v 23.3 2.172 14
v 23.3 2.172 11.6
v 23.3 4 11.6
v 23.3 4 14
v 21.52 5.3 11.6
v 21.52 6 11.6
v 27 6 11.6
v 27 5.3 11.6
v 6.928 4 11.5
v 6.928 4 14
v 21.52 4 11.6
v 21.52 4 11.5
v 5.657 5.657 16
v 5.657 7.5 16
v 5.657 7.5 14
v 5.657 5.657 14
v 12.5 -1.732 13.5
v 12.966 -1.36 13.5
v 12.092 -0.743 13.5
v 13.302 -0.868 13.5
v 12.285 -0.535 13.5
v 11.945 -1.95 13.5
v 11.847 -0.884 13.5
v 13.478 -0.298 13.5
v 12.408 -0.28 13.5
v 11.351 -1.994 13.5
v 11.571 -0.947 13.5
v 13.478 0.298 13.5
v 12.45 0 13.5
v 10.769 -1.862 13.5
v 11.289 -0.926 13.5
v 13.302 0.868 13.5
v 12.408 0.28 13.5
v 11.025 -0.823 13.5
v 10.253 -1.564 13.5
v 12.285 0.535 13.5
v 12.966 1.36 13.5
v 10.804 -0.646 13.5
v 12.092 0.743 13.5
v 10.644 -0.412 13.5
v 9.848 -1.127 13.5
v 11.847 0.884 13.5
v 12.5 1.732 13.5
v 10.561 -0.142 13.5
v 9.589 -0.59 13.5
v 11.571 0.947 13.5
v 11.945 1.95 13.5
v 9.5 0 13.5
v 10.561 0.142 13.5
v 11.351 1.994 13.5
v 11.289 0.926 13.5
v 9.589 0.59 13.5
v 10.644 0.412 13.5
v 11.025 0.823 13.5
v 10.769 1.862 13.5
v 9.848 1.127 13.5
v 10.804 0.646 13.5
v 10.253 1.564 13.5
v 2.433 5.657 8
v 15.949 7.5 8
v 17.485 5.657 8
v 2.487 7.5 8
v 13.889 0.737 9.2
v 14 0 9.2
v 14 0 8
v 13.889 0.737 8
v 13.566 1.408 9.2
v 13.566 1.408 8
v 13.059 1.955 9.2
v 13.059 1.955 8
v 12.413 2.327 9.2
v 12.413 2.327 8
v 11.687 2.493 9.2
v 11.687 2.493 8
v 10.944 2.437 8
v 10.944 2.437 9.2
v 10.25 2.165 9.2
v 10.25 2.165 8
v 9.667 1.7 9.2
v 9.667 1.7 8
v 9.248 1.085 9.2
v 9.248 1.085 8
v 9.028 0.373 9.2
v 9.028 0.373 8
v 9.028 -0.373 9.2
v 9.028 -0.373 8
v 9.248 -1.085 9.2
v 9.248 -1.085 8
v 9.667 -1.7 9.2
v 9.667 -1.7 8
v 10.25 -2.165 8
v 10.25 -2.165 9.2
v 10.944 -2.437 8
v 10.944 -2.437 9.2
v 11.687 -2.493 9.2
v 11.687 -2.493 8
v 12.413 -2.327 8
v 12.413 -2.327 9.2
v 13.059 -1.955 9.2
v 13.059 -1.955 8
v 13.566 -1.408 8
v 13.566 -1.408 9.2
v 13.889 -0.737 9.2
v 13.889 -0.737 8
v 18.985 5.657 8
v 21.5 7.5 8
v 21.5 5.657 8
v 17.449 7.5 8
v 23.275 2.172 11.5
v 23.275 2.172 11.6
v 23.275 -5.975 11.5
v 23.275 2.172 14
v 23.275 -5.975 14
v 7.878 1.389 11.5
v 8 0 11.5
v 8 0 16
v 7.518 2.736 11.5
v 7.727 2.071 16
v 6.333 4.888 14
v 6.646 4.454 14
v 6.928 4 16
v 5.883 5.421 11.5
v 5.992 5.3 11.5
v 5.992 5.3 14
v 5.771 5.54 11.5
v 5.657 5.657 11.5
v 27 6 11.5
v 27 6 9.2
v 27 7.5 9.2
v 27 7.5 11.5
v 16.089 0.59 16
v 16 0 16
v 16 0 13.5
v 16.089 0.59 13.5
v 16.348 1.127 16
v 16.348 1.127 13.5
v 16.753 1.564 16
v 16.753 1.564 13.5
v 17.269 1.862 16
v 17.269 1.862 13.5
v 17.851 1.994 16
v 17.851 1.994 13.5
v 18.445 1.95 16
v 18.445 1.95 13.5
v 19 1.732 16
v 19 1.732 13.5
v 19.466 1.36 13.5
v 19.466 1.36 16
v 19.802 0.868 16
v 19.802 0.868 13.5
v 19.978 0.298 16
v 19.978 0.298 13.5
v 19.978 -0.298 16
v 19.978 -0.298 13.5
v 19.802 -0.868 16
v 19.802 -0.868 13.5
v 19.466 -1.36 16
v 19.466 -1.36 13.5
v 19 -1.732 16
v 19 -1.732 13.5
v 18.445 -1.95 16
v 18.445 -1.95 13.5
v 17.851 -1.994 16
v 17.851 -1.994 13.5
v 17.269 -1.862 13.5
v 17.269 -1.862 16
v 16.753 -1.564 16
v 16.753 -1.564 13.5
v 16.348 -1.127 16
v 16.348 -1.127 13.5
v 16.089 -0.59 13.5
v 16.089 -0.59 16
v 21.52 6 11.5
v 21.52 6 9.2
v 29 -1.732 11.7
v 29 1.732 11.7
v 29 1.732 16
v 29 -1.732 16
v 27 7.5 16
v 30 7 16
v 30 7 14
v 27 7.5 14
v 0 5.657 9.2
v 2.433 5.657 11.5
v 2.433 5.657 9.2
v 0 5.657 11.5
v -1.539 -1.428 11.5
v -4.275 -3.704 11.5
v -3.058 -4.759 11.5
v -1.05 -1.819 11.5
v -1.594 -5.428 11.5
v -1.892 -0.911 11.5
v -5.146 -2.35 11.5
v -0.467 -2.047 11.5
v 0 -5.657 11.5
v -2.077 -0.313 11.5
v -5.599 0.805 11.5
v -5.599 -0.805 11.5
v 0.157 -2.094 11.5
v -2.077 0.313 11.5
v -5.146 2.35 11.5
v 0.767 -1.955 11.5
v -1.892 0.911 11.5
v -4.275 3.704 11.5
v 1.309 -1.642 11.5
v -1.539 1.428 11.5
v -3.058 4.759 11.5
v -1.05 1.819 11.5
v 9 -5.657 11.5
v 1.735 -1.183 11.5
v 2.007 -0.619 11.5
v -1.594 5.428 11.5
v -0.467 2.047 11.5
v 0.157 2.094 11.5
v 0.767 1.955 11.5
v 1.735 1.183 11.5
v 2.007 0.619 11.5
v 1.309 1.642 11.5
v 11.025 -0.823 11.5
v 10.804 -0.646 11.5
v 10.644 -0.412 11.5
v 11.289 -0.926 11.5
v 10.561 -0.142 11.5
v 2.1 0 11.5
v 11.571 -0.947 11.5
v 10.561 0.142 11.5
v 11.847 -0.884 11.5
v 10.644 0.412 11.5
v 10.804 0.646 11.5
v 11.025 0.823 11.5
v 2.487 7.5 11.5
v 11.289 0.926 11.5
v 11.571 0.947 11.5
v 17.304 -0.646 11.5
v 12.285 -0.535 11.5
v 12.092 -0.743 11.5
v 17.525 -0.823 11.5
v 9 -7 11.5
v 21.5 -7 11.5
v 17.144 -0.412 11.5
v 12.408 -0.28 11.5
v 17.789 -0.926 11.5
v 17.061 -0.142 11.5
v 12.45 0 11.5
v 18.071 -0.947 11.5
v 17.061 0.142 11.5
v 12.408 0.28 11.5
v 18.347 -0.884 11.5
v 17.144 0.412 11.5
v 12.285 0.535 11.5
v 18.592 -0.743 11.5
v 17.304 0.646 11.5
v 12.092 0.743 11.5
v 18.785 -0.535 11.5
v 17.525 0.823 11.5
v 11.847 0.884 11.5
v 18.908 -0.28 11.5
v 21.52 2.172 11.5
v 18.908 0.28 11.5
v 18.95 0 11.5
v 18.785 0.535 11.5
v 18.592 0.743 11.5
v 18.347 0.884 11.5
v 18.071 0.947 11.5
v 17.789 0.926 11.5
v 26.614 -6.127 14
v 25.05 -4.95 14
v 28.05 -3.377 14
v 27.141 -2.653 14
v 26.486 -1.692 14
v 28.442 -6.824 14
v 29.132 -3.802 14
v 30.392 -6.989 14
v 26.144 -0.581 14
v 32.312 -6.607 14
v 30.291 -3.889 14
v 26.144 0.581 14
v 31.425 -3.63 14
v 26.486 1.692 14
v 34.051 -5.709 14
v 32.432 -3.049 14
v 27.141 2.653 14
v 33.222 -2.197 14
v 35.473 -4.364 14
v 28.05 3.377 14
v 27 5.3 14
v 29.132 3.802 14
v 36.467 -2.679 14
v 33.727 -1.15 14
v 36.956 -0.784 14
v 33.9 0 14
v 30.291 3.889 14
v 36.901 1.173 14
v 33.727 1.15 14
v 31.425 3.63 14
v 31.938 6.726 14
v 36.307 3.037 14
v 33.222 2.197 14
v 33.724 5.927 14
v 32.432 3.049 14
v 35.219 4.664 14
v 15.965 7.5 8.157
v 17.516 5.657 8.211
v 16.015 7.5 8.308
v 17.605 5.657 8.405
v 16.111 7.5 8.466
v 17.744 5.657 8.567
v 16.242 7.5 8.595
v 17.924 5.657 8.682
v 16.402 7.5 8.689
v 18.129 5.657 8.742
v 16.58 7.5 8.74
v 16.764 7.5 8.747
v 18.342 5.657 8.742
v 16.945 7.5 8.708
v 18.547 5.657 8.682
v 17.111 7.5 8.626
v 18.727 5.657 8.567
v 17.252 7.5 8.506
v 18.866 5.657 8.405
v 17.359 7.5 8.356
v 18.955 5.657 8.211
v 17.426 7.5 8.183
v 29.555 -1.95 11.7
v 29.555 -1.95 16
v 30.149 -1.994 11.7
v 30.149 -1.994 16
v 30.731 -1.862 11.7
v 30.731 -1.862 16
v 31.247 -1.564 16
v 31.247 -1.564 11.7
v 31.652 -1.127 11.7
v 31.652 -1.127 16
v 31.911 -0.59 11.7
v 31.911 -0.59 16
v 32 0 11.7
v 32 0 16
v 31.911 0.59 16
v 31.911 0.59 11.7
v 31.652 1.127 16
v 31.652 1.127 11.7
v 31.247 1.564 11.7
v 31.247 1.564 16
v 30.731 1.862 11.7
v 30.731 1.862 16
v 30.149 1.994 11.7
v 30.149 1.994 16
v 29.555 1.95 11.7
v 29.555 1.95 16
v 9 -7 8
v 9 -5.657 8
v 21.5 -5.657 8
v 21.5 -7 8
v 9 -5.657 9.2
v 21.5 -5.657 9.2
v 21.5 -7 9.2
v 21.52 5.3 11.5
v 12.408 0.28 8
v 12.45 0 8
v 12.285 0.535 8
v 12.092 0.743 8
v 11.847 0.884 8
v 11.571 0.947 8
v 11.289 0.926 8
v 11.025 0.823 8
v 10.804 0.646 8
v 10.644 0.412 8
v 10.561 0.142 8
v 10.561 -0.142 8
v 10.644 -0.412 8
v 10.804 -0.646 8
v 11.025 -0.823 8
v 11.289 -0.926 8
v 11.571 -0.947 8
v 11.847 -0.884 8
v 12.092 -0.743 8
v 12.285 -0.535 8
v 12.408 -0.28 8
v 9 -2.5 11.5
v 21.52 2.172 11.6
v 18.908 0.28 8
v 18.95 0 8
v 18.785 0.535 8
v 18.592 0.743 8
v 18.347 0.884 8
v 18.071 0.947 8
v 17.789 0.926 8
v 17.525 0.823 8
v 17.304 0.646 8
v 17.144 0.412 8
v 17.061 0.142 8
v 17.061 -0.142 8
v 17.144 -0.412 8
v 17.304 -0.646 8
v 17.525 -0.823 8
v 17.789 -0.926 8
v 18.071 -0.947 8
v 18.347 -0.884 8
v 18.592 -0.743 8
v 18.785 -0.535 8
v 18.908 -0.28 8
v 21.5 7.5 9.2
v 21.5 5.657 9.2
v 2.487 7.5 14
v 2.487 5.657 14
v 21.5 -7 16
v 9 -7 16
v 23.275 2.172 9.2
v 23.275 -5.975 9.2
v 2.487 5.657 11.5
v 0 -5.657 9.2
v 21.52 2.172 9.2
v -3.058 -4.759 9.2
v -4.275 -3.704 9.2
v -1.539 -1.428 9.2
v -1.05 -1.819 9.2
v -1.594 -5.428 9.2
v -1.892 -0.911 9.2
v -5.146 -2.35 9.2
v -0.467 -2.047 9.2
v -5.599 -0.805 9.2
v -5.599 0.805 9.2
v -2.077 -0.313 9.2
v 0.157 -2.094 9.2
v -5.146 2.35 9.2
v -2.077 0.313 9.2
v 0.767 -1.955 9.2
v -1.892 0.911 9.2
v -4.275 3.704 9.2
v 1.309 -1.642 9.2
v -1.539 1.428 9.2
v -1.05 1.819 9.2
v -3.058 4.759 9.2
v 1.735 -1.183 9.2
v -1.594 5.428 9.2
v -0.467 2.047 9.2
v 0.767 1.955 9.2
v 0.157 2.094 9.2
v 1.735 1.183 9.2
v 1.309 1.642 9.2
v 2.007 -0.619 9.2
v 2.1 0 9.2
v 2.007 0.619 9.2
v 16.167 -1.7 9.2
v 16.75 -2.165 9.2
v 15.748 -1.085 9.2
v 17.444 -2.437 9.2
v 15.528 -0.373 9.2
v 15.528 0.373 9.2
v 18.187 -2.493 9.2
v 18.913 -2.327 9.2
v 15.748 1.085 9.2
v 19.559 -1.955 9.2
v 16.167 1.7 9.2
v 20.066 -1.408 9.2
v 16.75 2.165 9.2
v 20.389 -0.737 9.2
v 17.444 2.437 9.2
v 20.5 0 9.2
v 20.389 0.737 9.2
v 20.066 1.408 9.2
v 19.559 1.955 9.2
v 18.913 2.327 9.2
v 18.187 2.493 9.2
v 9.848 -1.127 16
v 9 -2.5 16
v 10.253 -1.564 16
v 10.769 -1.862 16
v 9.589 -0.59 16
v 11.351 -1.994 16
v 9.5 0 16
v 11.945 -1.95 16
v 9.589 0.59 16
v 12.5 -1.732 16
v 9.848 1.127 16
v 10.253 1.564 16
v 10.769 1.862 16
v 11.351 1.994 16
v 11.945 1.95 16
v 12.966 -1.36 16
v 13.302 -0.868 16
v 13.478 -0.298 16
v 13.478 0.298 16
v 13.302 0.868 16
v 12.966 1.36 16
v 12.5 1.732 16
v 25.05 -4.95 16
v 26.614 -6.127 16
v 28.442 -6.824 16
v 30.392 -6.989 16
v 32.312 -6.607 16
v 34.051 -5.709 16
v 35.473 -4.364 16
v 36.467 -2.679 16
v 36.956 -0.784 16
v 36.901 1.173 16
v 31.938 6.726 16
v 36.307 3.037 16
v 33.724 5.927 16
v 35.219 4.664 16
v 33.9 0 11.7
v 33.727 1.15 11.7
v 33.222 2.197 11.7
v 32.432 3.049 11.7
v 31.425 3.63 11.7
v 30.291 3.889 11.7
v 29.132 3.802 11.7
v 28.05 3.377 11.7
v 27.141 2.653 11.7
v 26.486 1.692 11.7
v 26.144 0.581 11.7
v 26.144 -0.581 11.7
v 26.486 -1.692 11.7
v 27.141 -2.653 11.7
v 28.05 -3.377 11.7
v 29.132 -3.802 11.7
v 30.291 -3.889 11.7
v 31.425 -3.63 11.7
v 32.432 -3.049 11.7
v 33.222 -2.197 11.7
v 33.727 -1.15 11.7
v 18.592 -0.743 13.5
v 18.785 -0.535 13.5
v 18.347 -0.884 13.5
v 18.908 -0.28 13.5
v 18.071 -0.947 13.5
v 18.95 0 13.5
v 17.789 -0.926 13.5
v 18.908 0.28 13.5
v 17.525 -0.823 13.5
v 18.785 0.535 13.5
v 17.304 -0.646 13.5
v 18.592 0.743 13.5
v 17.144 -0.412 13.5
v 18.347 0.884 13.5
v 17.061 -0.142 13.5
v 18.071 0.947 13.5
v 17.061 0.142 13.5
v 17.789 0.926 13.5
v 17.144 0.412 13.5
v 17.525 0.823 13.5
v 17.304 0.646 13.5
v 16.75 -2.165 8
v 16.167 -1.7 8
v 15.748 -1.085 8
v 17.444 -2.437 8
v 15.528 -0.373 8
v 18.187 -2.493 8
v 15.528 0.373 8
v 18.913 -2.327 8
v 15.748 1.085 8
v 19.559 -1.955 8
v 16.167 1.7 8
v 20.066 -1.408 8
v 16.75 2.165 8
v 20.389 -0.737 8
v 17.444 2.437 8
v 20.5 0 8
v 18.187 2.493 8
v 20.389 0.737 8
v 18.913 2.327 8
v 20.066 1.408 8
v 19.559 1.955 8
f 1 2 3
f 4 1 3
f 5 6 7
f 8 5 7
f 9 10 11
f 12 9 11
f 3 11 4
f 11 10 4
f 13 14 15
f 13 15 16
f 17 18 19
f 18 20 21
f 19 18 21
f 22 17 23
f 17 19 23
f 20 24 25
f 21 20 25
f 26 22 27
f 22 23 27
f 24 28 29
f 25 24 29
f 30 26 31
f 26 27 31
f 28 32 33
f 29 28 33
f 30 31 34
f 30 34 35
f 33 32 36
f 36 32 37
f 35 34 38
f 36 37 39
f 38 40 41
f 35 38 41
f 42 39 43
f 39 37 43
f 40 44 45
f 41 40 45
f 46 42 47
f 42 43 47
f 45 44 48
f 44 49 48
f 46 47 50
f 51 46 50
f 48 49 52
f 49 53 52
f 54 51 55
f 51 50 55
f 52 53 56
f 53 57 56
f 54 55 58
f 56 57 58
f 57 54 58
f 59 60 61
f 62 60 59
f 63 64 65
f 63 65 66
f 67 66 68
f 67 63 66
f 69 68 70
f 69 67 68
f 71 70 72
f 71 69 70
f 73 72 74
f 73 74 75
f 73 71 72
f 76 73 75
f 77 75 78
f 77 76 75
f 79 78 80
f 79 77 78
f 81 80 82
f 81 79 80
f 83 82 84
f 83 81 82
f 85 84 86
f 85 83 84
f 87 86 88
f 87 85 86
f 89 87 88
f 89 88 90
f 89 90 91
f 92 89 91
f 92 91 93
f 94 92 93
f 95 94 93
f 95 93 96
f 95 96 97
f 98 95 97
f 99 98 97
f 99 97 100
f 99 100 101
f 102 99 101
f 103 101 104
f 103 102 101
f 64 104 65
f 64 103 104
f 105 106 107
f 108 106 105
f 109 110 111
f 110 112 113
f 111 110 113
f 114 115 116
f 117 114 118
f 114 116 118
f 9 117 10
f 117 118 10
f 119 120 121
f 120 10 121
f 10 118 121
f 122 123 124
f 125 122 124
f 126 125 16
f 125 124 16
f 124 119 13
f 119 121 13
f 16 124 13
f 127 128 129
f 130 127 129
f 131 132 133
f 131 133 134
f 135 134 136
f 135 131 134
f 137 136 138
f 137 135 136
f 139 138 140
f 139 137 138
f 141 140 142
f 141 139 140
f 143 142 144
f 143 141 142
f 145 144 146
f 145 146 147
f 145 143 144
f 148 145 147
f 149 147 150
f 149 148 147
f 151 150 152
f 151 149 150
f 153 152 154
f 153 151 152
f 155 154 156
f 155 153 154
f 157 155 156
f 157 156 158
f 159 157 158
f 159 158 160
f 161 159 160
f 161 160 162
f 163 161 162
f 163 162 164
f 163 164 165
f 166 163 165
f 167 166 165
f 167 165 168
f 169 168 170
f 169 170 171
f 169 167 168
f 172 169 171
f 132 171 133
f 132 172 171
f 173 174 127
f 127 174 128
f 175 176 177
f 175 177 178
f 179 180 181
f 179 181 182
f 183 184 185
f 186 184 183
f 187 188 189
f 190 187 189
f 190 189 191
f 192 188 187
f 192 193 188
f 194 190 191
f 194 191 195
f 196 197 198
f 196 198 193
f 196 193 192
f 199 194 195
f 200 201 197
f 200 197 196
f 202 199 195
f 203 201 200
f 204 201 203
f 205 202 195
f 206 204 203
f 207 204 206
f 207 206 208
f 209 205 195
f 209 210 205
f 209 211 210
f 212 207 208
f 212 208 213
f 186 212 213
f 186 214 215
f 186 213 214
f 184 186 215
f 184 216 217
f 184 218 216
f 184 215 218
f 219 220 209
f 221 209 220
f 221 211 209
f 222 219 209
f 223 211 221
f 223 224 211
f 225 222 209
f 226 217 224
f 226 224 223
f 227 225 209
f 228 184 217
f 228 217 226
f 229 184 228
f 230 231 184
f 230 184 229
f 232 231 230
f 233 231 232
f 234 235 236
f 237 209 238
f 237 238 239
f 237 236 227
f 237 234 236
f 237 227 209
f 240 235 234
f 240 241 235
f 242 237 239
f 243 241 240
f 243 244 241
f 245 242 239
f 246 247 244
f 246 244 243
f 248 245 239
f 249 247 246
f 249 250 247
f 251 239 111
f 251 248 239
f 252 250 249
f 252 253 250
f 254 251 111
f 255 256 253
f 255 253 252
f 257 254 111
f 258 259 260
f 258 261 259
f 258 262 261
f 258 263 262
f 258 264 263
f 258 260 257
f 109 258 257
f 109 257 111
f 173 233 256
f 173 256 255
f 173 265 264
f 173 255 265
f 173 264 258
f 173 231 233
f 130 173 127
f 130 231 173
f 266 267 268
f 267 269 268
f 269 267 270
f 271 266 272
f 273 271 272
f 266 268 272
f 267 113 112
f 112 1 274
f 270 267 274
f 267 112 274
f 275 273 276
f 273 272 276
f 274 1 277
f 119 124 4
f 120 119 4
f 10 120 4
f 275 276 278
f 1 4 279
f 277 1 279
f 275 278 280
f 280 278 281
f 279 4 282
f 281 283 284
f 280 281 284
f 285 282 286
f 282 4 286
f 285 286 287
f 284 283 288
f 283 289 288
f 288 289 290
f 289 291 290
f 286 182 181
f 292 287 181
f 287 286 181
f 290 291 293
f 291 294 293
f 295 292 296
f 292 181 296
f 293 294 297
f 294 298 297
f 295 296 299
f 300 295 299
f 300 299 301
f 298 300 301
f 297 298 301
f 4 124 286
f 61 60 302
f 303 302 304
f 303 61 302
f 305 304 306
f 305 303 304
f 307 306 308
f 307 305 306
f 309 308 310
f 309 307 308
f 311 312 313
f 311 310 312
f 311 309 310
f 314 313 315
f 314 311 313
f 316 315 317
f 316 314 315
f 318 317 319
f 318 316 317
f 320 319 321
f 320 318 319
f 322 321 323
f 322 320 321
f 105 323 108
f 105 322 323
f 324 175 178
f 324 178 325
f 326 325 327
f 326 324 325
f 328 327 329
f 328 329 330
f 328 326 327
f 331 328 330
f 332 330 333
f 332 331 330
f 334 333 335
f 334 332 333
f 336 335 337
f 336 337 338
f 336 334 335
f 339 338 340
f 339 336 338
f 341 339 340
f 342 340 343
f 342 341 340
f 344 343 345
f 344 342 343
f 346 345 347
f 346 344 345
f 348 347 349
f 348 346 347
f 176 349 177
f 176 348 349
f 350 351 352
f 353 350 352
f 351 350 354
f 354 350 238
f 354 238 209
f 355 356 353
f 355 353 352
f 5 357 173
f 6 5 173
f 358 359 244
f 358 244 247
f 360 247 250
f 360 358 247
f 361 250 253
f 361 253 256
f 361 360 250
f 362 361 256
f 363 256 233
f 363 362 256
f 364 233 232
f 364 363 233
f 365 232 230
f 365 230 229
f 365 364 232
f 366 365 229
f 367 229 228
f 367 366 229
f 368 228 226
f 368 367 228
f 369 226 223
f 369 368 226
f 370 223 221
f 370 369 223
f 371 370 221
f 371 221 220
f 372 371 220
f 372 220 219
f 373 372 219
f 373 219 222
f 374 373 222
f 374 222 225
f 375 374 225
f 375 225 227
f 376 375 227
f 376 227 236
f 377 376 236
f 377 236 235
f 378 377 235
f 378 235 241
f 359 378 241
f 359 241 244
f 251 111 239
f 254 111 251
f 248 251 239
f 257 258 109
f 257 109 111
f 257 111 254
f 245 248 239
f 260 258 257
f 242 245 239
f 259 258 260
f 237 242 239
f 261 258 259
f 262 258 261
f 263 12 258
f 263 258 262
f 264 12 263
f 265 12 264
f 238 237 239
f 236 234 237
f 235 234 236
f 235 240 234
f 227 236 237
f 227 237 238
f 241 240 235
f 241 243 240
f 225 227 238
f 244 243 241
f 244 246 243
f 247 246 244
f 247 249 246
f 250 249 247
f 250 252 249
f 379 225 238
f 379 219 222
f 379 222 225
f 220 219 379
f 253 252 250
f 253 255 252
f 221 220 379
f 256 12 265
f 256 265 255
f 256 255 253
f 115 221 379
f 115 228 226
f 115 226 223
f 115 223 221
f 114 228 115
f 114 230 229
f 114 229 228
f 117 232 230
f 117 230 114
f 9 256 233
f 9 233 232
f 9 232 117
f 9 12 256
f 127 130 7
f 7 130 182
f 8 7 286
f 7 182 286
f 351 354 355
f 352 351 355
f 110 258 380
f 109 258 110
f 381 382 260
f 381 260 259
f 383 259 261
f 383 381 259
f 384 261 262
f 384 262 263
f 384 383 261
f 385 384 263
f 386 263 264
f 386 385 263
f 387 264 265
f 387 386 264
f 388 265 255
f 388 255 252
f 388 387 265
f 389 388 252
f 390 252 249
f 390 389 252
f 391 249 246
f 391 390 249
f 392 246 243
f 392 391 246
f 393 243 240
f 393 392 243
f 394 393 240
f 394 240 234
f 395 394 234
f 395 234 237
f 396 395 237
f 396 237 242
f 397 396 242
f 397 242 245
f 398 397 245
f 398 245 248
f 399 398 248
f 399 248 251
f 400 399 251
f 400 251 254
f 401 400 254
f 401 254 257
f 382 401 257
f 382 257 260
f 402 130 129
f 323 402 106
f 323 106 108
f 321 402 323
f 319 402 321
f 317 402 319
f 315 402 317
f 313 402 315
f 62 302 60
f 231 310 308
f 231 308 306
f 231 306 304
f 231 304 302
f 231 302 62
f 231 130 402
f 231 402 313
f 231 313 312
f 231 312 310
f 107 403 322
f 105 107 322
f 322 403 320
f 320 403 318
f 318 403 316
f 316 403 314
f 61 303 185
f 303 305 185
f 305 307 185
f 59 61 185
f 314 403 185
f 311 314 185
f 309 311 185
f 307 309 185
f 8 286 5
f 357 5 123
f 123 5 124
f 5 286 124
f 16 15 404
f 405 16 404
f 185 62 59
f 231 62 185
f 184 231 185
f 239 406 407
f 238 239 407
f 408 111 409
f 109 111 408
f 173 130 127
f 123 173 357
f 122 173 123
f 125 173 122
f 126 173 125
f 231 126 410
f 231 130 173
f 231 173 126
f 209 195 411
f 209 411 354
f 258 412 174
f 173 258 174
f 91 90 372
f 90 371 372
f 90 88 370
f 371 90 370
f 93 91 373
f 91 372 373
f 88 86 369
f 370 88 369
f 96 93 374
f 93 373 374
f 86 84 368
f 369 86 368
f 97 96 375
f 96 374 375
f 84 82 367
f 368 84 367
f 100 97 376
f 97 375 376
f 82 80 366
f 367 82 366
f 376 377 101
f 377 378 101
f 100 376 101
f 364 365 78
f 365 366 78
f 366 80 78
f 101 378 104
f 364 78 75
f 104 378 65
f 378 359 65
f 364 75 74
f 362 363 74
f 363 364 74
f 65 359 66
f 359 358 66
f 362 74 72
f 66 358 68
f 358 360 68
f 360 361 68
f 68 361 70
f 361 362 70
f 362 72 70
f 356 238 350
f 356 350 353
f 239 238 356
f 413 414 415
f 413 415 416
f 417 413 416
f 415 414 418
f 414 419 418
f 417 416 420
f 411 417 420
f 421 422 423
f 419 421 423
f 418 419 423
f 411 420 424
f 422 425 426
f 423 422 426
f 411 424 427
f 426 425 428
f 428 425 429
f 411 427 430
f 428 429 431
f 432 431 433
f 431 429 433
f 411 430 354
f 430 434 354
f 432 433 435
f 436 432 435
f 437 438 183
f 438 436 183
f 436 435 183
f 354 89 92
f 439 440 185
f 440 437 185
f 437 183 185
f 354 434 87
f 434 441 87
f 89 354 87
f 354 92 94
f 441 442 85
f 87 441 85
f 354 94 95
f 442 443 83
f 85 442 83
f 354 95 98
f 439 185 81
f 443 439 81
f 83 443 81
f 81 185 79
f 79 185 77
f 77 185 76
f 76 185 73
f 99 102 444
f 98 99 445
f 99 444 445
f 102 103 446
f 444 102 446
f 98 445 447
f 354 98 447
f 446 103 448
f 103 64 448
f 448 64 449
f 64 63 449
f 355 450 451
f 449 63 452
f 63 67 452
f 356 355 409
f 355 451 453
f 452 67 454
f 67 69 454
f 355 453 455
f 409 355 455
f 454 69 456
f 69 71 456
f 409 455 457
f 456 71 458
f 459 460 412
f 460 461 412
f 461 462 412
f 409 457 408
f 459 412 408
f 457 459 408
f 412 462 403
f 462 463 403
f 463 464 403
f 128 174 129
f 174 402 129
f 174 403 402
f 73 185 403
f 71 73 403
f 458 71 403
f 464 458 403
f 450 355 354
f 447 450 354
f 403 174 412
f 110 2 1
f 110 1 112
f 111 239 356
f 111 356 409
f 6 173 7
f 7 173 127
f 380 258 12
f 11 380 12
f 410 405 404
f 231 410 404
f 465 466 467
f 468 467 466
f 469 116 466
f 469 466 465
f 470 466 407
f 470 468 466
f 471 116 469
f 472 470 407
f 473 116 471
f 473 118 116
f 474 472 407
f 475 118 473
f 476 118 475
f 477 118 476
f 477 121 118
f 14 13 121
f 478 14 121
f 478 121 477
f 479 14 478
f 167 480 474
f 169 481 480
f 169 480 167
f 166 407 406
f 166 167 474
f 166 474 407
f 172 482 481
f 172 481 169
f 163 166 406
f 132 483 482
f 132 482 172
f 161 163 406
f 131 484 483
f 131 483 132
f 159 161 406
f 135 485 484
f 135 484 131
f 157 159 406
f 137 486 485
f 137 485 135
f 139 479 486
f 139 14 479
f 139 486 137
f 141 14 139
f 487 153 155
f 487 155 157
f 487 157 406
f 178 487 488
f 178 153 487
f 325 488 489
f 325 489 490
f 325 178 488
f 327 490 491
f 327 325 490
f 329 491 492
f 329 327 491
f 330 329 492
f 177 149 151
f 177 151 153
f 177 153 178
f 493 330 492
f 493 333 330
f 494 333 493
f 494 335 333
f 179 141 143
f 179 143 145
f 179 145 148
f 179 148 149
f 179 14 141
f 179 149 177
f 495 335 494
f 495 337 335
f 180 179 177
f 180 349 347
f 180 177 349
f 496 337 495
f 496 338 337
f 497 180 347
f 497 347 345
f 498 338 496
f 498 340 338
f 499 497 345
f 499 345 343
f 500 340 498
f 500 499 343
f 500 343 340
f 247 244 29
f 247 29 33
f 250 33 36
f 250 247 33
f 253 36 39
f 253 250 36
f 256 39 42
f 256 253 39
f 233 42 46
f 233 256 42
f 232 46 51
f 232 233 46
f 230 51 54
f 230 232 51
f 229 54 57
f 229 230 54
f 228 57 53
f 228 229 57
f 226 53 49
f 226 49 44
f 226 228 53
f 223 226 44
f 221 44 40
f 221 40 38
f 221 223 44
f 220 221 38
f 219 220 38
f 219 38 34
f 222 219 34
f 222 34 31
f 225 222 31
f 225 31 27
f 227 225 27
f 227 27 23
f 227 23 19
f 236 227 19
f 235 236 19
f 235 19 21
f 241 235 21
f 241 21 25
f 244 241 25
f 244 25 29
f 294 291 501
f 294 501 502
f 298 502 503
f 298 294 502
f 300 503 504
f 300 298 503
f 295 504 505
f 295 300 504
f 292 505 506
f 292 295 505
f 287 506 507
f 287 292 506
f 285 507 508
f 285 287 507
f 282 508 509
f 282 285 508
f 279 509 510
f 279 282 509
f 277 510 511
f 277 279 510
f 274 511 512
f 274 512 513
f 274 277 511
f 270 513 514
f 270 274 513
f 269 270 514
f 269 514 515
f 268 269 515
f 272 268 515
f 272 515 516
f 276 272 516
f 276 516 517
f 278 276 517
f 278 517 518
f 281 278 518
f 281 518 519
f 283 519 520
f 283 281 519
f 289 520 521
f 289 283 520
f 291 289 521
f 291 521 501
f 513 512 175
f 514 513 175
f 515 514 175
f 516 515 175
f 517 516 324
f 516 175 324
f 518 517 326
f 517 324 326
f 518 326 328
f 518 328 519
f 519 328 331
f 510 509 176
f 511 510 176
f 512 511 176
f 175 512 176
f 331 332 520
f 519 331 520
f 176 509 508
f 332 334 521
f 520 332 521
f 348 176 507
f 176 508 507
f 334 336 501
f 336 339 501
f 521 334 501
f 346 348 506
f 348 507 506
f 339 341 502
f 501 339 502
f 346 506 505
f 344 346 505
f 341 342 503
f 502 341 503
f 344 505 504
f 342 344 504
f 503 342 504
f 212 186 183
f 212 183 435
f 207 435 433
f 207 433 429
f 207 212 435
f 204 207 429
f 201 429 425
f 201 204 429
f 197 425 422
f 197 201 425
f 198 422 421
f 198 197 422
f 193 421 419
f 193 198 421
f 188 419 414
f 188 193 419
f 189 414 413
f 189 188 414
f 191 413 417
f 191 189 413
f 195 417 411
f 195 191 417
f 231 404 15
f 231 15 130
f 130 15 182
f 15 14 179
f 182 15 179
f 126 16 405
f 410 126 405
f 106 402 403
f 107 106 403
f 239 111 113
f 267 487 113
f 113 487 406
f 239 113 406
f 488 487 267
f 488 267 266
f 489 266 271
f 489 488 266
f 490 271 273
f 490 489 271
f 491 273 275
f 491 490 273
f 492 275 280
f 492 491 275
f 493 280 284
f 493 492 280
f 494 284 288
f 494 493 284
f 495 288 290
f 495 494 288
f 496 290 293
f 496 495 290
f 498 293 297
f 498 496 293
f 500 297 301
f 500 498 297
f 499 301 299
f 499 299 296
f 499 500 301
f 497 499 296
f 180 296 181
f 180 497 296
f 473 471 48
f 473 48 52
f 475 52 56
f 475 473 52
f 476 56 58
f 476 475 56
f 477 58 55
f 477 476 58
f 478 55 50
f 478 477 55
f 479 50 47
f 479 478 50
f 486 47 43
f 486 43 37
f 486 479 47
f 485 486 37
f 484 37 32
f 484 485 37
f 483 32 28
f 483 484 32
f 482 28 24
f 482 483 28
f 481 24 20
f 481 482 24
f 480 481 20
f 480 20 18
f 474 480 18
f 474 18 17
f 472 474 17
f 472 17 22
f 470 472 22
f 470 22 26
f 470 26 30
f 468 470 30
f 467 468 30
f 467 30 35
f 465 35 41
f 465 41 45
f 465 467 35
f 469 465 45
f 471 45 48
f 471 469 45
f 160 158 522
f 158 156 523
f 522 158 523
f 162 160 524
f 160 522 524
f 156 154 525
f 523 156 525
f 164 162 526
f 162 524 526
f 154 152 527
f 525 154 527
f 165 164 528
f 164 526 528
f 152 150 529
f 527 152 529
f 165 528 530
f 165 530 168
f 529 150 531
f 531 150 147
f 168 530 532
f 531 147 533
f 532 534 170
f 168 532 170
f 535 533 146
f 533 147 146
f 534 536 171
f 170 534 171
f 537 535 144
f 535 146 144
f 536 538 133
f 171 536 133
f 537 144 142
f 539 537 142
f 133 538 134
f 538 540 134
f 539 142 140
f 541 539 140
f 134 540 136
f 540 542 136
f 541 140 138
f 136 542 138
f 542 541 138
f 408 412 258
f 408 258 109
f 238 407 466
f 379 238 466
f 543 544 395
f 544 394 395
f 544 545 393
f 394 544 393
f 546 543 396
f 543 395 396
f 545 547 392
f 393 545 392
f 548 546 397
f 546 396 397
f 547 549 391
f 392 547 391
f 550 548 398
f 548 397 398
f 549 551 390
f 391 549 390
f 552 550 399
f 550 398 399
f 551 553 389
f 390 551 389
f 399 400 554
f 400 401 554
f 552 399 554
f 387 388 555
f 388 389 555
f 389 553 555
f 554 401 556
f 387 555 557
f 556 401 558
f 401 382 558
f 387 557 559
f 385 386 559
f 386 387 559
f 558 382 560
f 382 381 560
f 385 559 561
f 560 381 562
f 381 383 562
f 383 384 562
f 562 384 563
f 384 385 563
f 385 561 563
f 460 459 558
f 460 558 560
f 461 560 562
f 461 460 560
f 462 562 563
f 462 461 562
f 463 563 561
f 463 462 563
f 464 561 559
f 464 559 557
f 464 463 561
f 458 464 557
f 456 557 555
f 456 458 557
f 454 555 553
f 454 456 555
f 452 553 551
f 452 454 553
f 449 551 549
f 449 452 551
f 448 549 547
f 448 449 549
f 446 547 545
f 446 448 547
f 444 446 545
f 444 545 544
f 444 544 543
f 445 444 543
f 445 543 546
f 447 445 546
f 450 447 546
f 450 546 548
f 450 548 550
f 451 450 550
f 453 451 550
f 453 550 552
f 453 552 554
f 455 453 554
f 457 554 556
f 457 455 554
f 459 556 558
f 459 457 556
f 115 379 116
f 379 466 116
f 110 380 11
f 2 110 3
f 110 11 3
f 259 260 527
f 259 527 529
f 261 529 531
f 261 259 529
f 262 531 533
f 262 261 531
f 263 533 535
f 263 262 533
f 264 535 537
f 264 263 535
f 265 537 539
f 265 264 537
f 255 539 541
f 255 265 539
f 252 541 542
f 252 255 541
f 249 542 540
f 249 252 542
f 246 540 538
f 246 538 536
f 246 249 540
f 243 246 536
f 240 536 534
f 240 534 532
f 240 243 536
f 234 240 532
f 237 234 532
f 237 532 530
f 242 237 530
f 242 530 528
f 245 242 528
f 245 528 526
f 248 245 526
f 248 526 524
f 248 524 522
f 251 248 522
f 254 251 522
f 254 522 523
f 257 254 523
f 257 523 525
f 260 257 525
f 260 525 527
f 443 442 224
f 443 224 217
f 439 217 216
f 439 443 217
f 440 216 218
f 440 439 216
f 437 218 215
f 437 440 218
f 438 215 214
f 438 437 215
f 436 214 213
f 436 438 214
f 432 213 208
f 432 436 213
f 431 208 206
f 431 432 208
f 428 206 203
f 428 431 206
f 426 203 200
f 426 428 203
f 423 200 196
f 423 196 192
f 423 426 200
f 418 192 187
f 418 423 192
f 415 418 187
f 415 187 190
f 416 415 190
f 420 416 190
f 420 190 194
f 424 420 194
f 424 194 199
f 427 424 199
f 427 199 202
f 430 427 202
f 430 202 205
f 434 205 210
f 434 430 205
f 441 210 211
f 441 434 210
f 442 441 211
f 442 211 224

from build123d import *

# Parameters (mm, degrees)
BOSS_EXTRUDE1_DEPTH  = 2
BOSS_EXTRUDE6_DEPTH  = 2.5
CUT_EXTRUDE6_DEPTH   = 2.5
BOSS_EXTRUDE14_DEPTH = 2.3
SKETCH32_R           = 2.1
CUT_EXTRUDE7_DEPTH   = 2.3
SKETCH33_W           = 12.5
SKETCH33_H           = 1.343145751
BOSS_EXTRUDE15_DEPTH = 1.2
SKETCH35_W           = 5.479645997
SKETCH35_H           = 3.827993755
CUT_EXTRUDE8_DEPTH   = 2.4
SKETCH36_W           = 3.7
SKETCH36_H           = 1.827993755
CUT_EXTRUDE9_DEPTH   = 2.4
SKETCH37_R           = 3.9
BOSS_EXTRUDE16_DEPTH = 2.3
CUT_EXTRUDE10_DEPTH  = 5.3
SKETCH43_R           = 2.5
BOSS_EXTRUDE17_DEPTH = 1.2
SKETCH44_R           = 0.95
CUT_EXTRUDE11_DEPTH  = 9
SKETCH45_R           = 2
CUT_EXTRUDE12_DEPTH  = 2.5
SKETCH52_R           = 0.75
CUT_EXTRUDE13_DEPTH  = 10


with BuildPart() as part:
    # Sketch3 → Boss-Extrude1 (new body)
    with BuildSketch(Plane.XY):
        with BuildLine():
            Line((8, 0), (9, -2.5))
            Line((9, -2.5), (9, -7))
            Line((9, -7), (21.5, -7))
            Line((21.5, -7), (25.050252532, -4.949747468))
            ThreePointArc((25.050252532, -4.949747468), (36.467156728, -2.678784027), (30, 7))
            Line((30, 7), (27, 7.5))
            Line((27, 7.5), (5.656854249, 7.5))
            Line((5.656854249, 7.5), (5.656854249, 5.656854249))
            ThreePointArc((5.656854249, 5.656854249), (7.39103626, 3.061467459), (8, 0))
        make_face()
    extrude(amount=BOSS_EXTRUDE1_DEPTH)

    # Sketch22 → Boss-Extrude6 (add)
    with BuildSketch(Plane.XY.offset(2)):
        with BuildLine():
            Line((5.656854249, 5.656854249), (2.486790148, 5.656854249))
            Line((2.486790148, 5.656854249), (2.486790148, 7.5))
            Line((2.486790148, 7.5), (5.656854249, 7.5))
            Line((5.656854249, 7.5), (21.5, 7.5))
            Line((21.5, 7.5), (27, 7.5))
            Line((27, 7.5), (27, 2.172006245))
            Line((27, 2.172006245), (23.275126266, 2.172006245))
            Line((23.275126266, 2.172006245), (23.275126266, -5.974873734))
            Line((23.275126266, -5.974873734), (21.5, -7))
            Line((21.5, -7), (9, -7))
            Line((9, -7), (9, -2.5))
            Line((9, -2.5), (8, 0))
            ThreePointArc((8, 0), (7.39103626, 3.061467459), (5.656854249, 5.656854249))
        make_face()
    extrude(amount=BOSS_EXTRUDE6_DEPTH)

    # Sketch26 → Cut-Extrude6 (cut)
    with BuildSketch(Plane.XY.offset(2)):
        Polygon((18.098080448, 5.3), (2.530052458, 5.3), (2.530052458, 4), (18.098080448, 4), (27, 4), (27, 5.3), align=None)
    extrude(amount=CUT_EXTRUDE6_DEPTH, mode=Mode.SUBTRACT)


with BuildPart() as body_2:
    # Sketch31 → Boss-Extrude14 (new body)
    with BuildSketch(Plane.XY.offset(4.5)):
        with BuildLine():
            Line((2.432688066, 5.656854249), (0, 5.656854249))
            ThreePointArc((0, 5.656854249), (-5.656854249, 0), (0, -5.656854249))
            Line((0, -5.656854249), (9, -5.656854249))
            Line((9, -5.656854249), (9, -7))
            Line((9, -7), (21.5, -7))
            Line((21.5, -7), (23.275126266, -5.974873734))
            Line((23.275126266, -5.974873734), (23.275126266, 2.172006245))
            Line((23.275126266, 2.172006245), (27, 2.172006245))
            Line((27, 2.172006245), (27, 7.5))
            Line((27, 7.5), (2.486790148, 7.5))
            Line((2.486790148, 7.5), (2.432688066, 5.656854249))
        make_face()
    extrude(amount=BOSS_EXTRUDE14_DEPTH)

    # Sketch32 → Cut-Extrude7 (cut)
    with BuildSketch(Plane.XY.offset(6.8)):
        Circle(SKETCH32_R)
    extrude(amount=-CUT_EXTRUDE7_DEPTH, mode=Mode.SUBTRACT)

    # Sketch33 → Boss-Extrude15 (add)
    with BuildSketch(Plane.XY.offset(6.8)):
        with Locations((15.25, -6.328427125)):
            Rectangle(SKETCH33_W, SKETCH33_H)
        Polygon((2.486790148, 7.5), (21.5, 7.5), (21.5, 5.656854249), (2.432688066, 5.656854249), align=None)
    extrude(amount=BOSS_EXTRUDE15_DEPTH)


with BuildPart() as cut_extrude8_tool:
    # Sketch35 → Cut-Extrude8 (new body)
    with BuildSketch(Plane.XY.offset(6.8)):
        with Locations((24.260177002, 4.086003123)):
            Rectangle(SKETCH35_W, SKETCH35_H)
    extrude(amount=-CUT_EXTRUDE8_DEPTH)


with BuildPart() as part_1:
    add(part.part)

    # Cut-Extrude8: cut by cut_extrude8_tool
    add(cut_extrude8_tool.part, mode=Mode.SUBTRACT)

    # Sketch36 → Cut-Extrude9 (cut)
    with BuildSketch(Plane.XY.offset(4.4)):
        with Locations((25.15, 3.086003123)):
            Rectangle(SKETCH36_W, SKETCH36_H)
    extrude(amount=-CUT_EXTRUDE9_DEPTH, mode=Mode.SUBTRACT)

    # Sketch37 → Boss-Extrude16 (add)
    with BuildSketch(Plane.XY.offset(2)):
        with Locations((30, 0)):
            Circle(SKETCH37_R)
    extrude(amount=BOSS_EXTRUDE16_DEPTH)

    # Sketch39 → Cut-Extrude10 (cut, through all)
    with BuildSketch(Plane.XY.offset(4.3)):
        with BuildLine():
            Line((29, 1.732050808), (29, -1.732050808))
            ThreePointArc((29, -1.732050808), (32, 0), (29, 1.732050808))
        make_face()
    extrude(amount=-CUT_EXTRUDE10_DEPTH, mode=Mode.SUBTRACT)


with BuildPart() as body_2_1:
    add(body_2.part)

    # Cut-Extrude8: cut by cut_extrude8_tool
    add(cut_extrude8_tool.part, mode=Mode.SUBTRACT)

    # Sketch43 → Boss-Extrude17 (add)
    with BuildSketch(Plane.XY.offset(6.8)):
        with Locations((11.5, 0)):
            Circle(SKETCH43_R)
        with Locations((18, 0)):
            Circle(SKETCH43_R)
    extrude(amount=BOSS_EXTRUDE17_DEPTH)


with BuildPart() as cut_extrude11_tool:
    # Sketch44 → Cut-Extrude11 (new body, through all)
    with BuildSketch(Plane.XY.offset(8)):
        with Locations((11.5, 0)):
            Circle(SKETCH44_R)
        with Locations((18, 0)):
            Circle(SKETCH44_R)
    extrude(amount=-CUT_EXTRUDE11_DEPTH)


with BuildPart() as part_2:
    add(part_1.part)

    # Cut-Extrude11: cut by cut_extrude11_tool
    add(cut_extrude11_tool.part, mode=Mode.SUBTRACT)

    # Sketch45 → Cut-Extrude12 (cut)
    with BuildSketch(Plane(origin=(0, 0, 0), x_dir=(-1, 0, 0), z_dir=(0, 0, -1))):
        with Locations((-11.5, 0)):
            Circle(SKETCH45_R)
        with Locations((-18, 0)):
            Circle(SKETCH45_R)
    extrude(amount=-CUT_EXTRUDE12_DEPTH, mode=Mode.SUBTRACT)


with BuildPart() as body_2_2:
    add(body_2_1.part)

    # Cut-Extrude11: cut by cut_extrude11_tool
    add(cut_extrude11_tool.part, mode=Mode.SUBTRACT)

    # Sketch52 → Cut-Extrude13 (cut, along a direction that is not the sketch's normal)
    with BuildSketch(Plane.XZ.offset(-5.656854249)):
        with Locations((18.235476819, 8)):
            Circle(SKETCH52_R)
    extrude(amount=-CUT_EXTRUDE13_DEPTH, dir=(0.640410196, -0.76803306, 0), mode=Mode.SUBTRACT)


with BuildPart() as body_3:
    # Mirror1: mirrored copy
    add(body_2_2.part.mirror(Plane.XY.offset(8)))


with BuildPart() as body_4:
    # Mirror1 2: mirrored copy
    add(part_2.part.mirror(Plane.XY.offset(8)))


solid = Compound([body_3.part, body_4.part])
